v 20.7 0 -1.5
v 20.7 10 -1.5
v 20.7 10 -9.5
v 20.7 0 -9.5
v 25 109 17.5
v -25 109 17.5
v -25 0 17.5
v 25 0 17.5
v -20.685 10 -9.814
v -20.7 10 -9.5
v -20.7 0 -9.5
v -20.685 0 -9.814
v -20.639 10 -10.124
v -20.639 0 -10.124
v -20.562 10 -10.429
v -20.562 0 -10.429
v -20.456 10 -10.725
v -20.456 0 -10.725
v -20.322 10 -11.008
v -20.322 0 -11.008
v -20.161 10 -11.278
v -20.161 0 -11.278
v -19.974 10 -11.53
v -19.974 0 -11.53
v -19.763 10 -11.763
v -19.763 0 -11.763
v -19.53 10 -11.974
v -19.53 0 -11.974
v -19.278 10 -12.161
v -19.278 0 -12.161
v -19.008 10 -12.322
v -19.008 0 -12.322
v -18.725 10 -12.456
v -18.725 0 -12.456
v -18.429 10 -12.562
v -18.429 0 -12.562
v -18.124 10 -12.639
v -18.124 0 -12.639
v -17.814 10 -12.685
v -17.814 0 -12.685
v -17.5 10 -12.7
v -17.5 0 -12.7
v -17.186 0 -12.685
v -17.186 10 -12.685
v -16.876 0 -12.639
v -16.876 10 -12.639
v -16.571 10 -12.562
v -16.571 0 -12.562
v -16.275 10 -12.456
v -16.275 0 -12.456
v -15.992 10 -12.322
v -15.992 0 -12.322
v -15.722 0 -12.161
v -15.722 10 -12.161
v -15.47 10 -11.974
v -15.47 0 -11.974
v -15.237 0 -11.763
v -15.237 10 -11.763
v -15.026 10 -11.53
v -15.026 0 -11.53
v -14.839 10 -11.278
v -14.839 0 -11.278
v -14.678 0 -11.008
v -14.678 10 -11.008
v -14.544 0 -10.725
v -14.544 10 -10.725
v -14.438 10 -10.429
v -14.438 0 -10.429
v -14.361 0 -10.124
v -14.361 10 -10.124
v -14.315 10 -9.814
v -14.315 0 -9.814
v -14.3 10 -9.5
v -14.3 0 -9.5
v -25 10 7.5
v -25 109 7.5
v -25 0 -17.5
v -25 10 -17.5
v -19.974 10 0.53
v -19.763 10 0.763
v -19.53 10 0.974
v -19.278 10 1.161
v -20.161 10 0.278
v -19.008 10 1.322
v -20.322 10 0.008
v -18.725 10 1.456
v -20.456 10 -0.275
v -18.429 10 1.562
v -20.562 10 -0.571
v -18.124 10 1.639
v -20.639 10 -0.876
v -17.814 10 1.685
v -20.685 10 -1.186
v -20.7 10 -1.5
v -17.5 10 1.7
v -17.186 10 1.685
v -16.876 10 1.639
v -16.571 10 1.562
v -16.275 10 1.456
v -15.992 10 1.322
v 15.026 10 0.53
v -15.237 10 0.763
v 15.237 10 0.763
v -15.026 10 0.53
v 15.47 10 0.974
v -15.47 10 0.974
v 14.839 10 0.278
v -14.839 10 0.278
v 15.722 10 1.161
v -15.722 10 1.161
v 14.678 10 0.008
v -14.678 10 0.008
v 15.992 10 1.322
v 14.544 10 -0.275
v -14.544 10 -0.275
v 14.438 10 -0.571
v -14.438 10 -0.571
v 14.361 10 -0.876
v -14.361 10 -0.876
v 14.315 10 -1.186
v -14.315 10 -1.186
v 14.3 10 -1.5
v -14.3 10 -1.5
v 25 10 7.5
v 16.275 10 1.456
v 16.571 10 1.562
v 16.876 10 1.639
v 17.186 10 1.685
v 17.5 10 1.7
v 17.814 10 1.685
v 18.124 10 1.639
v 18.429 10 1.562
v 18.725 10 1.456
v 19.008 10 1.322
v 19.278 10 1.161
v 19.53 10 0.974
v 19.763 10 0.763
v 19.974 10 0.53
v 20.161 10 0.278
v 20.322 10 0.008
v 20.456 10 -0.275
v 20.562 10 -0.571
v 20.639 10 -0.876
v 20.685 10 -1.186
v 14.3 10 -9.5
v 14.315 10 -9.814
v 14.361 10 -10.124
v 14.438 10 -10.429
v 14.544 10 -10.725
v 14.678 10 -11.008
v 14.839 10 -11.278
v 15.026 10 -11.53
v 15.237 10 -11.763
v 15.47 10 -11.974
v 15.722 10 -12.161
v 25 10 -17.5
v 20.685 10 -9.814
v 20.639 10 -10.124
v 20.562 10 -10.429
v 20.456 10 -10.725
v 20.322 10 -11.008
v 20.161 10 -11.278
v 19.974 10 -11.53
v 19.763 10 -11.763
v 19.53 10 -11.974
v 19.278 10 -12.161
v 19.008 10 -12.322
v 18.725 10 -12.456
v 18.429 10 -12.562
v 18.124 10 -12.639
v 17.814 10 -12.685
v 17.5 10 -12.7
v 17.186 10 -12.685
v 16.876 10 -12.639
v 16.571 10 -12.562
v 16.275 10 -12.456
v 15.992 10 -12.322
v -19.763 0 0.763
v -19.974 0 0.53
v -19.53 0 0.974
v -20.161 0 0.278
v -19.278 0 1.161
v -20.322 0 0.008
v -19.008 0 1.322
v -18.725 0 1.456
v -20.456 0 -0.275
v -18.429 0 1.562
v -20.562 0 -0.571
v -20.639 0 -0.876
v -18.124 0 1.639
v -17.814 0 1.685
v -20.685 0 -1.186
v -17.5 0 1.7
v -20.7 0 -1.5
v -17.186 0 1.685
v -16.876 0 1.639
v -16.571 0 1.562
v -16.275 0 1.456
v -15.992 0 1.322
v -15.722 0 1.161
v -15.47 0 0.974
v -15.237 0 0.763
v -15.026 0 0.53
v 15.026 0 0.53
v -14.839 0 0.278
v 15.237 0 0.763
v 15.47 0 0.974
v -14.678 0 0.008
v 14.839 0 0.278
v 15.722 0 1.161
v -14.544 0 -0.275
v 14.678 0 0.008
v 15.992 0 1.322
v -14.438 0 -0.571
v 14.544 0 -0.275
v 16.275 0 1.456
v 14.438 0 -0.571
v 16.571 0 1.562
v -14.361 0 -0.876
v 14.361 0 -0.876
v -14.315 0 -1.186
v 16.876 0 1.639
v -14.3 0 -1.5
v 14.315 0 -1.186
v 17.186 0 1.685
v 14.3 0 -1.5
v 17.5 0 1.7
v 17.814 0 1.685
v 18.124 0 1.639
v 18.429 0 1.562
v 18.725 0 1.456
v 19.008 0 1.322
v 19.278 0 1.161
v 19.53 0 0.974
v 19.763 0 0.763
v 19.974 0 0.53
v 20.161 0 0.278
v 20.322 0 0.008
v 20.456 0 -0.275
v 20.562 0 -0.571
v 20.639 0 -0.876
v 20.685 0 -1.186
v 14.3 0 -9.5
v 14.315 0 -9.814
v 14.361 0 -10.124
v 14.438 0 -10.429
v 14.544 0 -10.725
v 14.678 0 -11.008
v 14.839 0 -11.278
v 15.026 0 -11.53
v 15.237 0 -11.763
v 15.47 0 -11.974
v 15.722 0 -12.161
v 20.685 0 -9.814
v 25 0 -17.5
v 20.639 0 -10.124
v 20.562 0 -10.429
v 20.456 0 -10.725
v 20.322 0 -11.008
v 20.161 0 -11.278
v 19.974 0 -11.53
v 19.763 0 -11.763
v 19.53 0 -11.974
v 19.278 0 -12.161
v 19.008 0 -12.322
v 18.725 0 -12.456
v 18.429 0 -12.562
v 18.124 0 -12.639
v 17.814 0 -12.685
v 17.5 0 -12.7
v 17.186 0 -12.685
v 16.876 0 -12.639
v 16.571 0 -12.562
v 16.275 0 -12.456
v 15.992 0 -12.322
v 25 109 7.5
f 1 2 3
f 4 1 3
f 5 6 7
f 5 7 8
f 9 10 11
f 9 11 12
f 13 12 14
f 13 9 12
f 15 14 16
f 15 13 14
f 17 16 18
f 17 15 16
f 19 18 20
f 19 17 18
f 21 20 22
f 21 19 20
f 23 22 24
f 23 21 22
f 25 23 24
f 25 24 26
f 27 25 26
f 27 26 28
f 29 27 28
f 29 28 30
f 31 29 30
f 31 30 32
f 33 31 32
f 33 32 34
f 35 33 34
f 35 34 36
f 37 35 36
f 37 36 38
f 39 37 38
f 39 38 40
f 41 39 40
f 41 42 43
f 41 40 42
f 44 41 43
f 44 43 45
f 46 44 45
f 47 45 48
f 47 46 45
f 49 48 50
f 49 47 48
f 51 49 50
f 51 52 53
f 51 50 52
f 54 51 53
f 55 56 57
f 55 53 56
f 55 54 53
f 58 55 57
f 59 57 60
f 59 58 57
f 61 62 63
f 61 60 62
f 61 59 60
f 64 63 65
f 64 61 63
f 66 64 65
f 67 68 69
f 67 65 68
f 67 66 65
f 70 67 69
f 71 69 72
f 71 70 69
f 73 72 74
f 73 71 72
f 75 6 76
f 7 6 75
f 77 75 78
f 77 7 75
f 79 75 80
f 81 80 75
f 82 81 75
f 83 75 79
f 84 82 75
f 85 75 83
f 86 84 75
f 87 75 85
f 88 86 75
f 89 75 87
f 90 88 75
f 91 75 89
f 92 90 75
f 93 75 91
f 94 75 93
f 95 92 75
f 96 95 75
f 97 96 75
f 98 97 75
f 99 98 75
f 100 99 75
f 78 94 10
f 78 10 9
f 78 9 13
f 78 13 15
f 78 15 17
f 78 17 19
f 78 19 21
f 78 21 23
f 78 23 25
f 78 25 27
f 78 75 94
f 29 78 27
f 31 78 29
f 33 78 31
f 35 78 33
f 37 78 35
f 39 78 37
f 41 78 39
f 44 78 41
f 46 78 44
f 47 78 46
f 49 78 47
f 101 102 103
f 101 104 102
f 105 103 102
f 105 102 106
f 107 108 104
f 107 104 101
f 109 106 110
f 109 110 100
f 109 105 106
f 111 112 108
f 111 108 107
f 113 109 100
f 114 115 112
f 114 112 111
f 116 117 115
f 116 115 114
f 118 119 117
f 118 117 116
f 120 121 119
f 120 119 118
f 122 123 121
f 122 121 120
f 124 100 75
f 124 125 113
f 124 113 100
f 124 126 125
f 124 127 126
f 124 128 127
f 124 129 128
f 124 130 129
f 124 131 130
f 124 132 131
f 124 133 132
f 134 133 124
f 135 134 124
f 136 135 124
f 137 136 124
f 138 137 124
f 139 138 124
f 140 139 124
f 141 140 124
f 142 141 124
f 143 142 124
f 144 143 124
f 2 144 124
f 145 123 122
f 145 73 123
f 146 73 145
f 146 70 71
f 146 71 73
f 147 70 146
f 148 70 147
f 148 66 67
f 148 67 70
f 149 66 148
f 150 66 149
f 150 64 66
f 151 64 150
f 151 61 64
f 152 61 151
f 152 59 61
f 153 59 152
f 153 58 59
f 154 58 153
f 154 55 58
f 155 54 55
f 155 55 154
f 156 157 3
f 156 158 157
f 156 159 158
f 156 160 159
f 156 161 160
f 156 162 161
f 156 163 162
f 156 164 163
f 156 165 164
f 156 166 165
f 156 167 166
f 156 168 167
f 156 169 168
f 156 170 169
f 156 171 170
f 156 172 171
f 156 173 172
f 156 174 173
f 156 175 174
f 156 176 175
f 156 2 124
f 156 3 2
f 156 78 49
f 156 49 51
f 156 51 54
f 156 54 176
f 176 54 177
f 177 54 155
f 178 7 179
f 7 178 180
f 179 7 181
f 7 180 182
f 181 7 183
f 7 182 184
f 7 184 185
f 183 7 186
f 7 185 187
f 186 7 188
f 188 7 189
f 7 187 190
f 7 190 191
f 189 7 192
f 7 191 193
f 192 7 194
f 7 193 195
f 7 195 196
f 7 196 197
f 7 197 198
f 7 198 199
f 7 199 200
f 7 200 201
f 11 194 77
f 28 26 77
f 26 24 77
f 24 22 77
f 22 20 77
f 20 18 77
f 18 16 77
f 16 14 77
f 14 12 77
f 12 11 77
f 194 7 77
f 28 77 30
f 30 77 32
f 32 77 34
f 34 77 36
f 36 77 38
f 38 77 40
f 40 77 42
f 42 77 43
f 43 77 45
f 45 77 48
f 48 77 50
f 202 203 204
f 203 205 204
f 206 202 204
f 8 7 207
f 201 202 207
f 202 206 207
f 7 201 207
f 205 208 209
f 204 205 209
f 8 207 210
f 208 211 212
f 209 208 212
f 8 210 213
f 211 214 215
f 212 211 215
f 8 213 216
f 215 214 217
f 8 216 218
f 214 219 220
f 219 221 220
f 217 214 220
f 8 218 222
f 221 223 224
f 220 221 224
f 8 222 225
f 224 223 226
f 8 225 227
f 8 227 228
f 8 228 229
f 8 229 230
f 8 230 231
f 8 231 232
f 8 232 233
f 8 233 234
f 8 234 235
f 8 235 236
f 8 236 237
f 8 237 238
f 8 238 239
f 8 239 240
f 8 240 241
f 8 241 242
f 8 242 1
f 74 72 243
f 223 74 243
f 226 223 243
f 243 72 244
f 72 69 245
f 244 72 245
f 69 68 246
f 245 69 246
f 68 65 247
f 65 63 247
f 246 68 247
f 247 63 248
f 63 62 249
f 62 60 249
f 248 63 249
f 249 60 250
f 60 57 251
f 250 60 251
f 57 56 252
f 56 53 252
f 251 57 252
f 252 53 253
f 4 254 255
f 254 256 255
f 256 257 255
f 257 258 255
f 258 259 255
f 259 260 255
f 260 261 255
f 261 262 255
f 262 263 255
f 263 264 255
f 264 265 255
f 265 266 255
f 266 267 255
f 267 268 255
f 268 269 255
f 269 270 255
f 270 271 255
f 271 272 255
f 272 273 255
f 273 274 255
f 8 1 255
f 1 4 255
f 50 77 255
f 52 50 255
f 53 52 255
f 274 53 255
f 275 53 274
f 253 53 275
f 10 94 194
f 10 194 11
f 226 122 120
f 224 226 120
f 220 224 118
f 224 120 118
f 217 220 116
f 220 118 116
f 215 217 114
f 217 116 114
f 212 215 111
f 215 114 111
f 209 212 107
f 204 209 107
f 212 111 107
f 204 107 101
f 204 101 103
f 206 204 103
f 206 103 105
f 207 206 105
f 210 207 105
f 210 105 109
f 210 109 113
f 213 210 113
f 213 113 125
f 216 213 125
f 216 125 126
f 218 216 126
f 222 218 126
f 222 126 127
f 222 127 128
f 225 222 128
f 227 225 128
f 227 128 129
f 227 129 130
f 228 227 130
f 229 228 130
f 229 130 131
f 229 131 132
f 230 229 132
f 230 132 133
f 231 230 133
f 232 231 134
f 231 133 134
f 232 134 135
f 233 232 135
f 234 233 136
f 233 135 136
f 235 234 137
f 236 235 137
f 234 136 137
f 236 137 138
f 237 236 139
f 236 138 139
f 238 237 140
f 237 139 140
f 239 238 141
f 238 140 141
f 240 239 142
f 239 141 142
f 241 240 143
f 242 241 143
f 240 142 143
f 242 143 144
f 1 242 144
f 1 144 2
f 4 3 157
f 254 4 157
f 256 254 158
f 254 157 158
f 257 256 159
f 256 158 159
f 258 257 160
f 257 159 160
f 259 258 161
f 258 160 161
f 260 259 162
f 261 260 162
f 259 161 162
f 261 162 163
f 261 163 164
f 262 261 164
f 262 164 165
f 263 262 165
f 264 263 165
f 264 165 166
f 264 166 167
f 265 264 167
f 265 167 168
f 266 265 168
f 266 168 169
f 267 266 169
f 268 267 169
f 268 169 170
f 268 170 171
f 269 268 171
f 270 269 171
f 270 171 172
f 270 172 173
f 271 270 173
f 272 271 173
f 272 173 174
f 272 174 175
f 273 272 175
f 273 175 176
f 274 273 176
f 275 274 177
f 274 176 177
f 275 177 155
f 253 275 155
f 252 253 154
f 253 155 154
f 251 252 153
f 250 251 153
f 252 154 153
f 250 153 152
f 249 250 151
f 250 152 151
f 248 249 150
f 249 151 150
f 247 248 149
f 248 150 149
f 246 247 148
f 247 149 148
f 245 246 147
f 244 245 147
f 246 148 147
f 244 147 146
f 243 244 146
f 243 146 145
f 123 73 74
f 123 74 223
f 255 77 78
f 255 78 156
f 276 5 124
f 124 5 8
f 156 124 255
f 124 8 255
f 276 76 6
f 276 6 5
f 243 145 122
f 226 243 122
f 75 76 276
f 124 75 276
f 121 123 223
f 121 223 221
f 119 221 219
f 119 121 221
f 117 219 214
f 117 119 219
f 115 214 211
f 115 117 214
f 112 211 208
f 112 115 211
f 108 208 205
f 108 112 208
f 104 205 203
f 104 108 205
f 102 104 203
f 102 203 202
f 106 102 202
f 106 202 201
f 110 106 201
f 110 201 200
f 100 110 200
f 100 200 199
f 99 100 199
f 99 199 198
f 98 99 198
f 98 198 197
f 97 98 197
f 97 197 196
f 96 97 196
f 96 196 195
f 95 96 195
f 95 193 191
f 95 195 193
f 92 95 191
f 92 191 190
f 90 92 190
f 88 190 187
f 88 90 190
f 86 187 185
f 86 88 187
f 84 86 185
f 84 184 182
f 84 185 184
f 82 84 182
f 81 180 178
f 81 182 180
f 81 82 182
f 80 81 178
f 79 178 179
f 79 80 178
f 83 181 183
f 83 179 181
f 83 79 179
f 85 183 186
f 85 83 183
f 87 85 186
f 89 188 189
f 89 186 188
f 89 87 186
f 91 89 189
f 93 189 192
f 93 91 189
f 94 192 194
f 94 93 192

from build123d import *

# Parameters (mm, degrees)
SKETCH_1_W          = 50
SKETCH_1_H          = 35
EXTRUDE_1_DEPTH     = 109
SKETCH_2_W          = 50
SKETCH_2_H          = 25
CUT_EXTRUDE_1_DEPTH = 99
CUT_EXTRUDE_2_DEPTH = 11


with BuildPart() as part:
    # 草图1 → 凸台-拉伸1 (new body)
    with BuildSketch(Plane(origin=(0, 0, 0), x_dir=(1, 0, 0), z_dir=(0, 1, 0))):
        Rectangle(SKETCH_1_W, SKETCH_1_H)
    extrude(amount=EXTRUDE_1_DEPTH)

    # 草图2 → 切除-拉伸1 (cut)
    with BuildSketch(Plane(origin=(0, 109, 0), x_dir=(1, 0, 0), z_dir=(0, 1, 0))):
        with Locations((0, 5)):
            Rectangle(SKETCH_2_W, SKETCH_2_H)
    extrude(amount=-CUT_EXTRUDE_1_DEPTH, mode=Mode.SUBTRACT)

    # 草图3 → 切除-拉伸2 (cut, through all)
    with BuildSketch(Plane(origin=(0, 10, 0), x_dir=(1, 0, 0), z_dir=(0, 1, 0))):
        with BuildLine():
            Line((-20.7, 1.5), (-20.7, 9.5))
            ThreePointArc((-20.7, 9.5), (-17.5, 12.7), (-14.3, 9.5))
            Line((-14.3, 9.5), (-14.3, 1.5))
            ThreePointArc((-14.3, 1.5), (-17.5, -1.7), (-20.7, 1.5))
        make_face()
        with BuildLine():
            Line((20.7, 1.5), (20.7, 9.5))
            ThreePointArc((20.7, 9.5), (17.5, 12.7), (14.3, 9.5))
            Line((14.3, 9.5), (14.3, 1.5))
            ThreePointArc((14.3, 1.5), (17.5, -1.7), (20.7, 1.5))
        make_face()
    extrude(amount=-CUT_EXTRUDE_2_DEPTH, mode=Mode.SUBTRACT)


solid = part.part
